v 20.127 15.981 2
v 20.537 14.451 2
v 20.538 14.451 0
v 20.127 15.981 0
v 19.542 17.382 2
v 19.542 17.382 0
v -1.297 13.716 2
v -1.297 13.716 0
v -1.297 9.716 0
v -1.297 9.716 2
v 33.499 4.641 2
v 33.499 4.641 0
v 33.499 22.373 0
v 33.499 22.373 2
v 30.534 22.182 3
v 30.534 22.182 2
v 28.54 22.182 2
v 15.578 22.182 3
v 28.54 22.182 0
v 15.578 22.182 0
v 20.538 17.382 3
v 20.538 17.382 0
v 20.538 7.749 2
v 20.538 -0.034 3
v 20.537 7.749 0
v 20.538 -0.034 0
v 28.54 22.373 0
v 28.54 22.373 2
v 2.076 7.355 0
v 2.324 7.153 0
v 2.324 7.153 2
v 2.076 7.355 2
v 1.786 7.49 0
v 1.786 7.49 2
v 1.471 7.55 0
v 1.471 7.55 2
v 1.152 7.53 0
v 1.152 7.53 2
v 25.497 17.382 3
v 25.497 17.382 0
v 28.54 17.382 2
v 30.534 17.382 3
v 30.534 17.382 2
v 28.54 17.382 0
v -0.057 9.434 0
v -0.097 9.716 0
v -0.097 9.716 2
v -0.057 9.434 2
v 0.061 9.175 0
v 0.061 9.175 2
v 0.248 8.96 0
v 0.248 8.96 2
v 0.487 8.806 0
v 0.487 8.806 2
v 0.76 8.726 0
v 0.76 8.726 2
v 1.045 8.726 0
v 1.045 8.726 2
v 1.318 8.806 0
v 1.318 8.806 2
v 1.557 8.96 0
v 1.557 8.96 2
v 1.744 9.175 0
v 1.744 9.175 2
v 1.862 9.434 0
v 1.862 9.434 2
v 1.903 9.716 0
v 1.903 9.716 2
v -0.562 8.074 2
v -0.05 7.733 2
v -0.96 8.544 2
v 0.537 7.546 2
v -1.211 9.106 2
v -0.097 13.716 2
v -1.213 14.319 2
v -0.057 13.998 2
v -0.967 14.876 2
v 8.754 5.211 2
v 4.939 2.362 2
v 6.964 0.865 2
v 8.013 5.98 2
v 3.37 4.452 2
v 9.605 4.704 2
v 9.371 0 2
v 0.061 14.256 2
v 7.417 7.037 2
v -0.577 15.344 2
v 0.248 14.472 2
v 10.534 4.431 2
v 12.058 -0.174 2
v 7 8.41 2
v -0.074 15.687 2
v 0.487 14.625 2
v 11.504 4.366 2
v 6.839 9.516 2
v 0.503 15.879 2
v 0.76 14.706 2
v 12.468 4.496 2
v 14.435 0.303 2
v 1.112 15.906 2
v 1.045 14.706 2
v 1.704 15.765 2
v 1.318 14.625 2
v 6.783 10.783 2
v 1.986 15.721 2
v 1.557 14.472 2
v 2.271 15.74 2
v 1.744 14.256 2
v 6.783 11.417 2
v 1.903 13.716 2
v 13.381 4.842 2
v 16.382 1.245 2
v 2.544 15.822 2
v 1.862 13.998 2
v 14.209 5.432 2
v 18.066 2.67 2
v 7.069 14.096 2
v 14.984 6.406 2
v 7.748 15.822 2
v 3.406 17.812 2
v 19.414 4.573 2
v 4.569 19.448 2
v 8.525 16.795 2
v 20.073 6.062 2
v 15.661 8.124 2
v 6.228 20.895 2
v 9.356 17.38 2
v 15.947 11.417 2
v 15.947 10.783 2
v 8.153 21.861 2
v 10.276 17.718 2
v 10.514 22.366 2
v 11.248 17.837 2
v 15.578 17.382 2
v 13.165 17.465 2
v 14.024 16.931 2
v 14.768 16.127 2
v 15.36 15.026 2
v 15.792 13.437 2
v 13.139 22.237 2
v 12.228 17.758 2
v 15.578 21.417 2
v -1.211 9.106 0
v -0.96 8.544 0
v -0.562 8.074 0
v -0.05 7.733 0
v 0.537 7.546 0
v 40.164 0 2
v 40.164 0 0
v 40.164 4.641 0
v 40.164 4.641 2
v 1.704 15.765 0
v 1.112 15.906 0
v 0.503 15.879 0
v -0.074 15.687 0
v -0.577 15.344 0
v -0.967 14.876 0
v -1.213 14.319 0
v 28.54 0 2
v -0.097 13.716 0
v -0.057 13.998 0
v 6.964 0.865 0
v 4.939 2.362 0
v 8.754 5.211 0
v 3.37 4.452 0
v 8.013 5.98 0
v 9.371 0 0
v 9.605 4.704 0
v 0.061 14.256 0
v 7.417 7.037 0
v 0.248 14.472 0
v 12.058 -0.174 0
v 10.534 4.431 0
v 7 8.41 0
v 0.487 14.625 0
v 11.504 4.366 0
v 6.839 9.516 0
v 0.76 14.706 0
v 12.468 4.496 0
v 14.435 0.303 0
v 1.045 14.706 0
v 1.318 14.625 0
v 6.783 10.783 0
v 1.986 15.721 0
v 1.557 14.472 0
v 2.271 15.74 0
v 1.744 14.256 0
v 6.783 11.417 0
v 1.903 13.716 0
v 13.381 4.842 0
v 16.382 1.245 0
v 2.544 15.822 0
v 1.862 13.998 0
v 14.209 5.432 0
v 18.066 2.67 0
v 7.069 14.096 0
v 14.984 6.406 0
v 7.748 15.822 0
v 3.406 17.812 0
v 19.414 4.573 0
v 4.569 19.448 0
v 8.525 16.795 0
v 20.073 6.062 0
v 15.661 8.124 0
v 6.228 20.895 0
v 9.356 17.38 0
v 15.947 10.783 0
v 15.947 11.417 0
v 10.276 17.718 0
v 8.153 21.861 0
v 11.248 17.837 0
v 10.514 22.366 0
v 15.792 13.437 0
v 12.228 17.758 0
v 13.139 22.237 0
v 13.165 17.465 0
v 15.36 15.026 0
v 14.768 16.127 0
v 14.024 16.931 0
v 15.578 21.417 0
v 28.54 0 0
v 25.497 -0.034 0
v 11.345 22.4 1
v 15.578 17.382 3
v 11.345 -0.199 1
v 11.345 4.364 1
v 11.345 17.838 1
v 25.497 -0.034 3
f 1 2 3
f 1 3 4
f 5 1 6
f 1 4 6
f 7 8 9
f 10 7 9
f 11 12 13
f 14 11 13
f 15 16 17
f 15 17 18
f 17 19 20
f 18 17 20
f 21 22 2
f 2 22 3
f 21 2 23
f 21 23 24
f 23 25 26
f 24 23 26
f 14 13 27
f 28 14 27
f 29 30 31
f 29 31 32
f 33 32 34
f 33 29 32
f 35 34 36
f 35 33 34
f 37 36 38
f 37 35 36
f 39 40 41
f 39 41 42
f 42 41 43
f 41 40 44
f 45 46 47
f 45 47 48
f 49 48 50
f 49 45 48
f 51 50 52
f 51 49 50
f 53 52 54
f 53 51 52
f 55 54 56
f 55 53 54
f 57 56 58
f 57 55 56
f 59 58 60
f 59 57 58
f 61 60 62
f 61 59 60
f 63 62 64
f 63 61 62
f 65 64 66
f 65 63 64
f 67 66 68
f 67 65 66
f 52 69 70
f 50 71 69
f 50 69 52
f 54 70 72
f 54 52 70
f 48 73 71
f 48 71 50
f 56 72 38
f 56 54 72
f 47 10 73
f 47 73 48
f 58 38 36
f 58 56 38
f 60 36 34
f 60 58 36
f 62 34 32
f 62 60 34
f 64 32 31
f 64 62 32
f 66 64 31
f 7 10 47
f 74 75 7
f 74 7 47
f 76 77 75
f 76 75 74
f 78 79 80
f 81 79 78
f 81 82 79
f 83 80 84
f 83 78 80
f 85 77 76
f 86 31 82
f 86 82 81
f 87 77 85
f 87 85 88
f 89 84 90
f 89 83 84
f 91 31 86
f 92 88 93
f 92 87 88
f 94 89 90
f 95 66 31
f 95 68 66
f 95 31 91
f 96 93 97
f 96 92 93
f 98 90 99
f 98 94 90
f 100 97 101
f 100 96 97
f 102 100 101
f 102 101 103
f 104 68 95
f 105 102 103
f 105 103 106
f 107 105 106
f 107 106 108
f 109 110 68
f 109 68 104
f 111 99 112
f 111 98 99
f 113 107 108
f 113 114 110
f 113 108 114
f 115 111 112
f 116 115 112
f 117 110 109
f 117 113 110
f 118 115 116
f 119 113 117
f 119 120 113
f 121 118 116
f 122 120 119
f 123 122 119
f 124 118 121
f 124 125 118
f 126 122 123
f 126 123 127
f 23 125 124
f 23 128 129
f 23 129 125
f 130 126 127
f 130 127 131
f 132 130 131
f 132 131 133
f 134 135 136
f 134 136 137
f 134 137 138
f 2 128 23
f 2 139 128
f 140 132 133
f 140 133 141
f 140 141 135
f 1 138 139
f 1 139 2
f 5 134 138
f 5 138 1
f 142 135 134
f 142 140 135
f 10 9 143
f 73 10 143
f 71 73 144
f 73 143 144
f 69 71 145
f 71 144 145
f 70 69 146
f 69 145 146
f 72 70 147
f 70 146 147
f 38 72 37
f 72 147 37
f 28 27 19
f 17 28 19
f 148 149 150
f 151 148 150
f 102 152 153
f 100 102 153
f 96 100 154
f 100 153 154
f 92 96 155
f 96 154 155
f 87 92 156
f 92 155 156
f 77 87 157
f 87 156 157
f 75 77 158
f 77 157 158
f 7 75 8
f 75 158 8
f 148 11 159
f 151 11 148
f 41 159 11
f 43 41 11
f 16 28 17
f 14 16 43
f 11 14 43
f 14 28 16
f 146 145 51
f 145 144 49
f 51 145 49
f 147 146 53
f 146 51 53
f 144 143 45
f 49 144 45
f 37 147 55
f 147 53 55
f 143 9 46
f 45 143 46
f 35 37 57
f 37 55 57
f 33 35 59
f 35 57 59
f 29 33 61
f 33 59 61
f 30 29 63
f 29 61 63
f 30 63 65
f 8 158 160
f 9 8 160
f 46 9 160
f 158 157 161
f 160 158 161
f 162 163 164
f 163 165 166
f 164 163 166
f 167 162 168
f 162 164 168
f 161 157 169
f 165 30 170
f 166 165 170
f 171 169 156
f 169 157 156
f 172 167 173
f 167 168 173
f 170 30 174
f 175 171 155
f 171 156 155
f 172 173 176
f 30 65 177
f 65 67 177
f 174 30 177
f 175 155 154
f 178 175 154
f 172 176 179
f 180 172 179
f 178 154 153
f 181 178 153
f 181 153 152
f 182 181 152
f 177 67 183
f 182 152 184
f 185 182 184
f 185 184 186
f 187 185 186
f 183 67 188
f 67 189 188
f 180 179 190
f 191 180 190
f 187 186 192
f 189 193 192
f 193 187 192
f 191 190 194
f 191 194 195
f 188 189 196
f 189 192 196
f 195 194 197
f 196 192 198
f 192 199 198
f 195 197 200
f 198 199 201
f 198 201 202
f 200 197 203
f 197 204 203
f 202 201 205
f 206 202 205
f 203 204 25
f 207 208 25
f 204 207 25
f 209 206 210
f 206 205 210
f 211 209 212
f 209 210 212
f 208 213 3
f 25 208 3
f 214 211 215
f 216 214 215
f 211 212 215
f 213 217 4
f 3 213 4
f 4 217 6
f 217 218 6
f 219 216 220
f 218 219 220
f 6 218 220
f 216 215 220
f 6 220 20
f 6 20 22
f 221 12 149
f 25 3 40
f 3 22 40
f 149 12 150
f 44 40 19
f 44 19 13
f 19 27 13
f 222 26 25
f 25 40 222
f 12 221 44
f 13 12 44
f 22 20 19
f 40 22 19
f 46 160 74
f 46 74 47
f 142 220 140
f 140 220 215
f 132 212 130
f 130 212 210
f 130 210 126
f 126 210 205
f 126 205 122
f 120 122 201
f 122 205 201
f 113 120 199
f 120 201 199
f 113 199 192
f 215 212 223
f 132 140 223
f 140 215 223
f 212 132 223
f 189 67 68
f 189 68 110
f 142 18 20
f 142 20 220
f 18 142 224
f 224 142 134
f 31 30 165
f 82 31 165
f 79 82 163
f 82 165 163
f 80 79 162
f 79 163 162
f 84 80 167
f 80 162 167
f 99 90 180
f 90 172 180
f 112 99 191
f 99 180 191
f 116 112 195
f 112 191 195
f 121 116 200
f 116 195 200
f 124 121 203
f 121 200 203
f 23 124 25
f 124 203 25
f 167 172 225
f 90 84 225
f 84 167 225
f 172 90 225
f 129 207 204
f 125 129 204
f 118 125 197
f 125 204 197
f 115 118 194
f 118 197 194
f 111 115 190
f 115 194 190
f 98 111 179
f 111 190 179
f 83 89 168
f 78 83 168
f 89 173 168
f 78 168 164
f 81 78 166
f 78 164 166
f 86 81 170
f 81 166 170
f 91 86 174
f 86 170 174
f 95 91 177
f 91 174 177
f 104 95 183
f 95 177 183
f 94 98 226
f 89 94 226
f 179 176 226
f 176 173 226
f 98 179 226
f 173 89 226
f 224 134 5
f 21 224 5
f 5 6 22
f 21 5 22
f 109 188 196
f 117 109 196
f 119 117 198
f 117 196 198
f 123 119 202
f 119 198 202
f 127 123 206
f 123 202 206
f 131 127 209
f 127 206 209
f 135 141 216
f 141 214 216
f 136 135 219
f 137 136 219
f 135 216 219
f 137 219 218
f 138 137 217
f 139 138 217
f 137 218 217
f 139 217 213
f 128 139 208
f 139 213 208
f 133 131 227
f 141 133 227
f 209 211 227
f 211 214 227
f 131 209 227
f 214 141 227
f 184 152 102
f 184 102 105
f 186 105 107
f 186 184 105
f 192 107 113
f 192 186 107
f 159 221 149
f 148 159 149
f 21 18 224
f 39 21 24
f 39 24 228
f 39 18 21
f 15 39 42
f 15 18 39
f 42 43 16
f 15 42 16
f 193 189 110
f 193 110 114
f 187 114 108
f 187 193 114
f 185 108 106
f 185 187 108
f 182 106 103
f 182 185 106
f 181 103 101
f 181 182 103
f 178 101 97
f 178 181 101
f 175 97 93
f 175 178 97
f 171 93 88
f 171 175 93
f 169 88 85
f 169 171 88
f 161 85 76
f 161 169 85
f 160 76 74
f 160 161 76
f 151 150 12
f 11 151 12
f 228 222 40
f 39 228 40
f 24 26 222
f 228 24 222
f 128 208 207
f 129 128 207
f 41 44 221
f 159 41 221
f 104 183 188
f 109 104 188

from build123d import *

# Parameters (mm, degrees)
PAD_DEPTH    = 2
PAD001_DEPTH = 3
PAD002_DEPTH = 2
PAD003_DEPTH = 2


with BuildPart() as part:
    # Sketch001 → Pad (new body)
    with BuildSketch(Plane.XY):
        with BuildLine():
            add(Edge.make_bspline(
                [(11.345455, -0.198864), (16.382955, -0.198864), (20.826136, 3.529545), (20.826136, 10.782955)],
                knots=[0, 0, 0, 0, 1, 1, 1, 1], degree=3))
            Line((20.826136, 10.782955), (20.826136, 11.417045))
            add(Edge.make_bspline(
                [(20.826136, 11.417045), (20.826136, 18.670455), (16.382955, 22.4), (11.345455, 22.4)],
                knots=[0, 0, 0, 0, 1, 1, 1, 1], degree=3))
            add(Edge.make_bspline(
                [(11.345455, 22.4), (6.306818, 22.4), (1.903409, 18.670455), (1.903409, 11.417045)],
                knots=[0, 0, 0, 0, 1, 1, 1, 1], degree=3))
            Line((1.903409, 11.417045), (1.903409, 10.782955))
            add(Edge.make_bspline(
                [(1.903409, 10.782955), (1.903409, 3.529545), (6.306818, -0.198864), (11.345455, -0.198864)],
                knots=[0, 0, 0, 0, 1, 1, 1, 1], degree=3))
        make_face()
        with BuildLine():
            add(Edge.make_bspline(
                [(11.345455, 4.363636), (9.004545, 4.363636), (6.782955, 5.948864), (6.782955, 10.782955)],
                knots=[0, 0, 0, 0, 1, 1, 1, 1], degree=3))
            Line((6.782955, 10.782955), (6.782955, 11.417045))
            add(Edge.make_bspline(
                [(6.782955, 11.417045), (6.782955, 16.252273), (9.004545, 17.8375), (11.345455, 17.8375)],
                knots=[0, 0, 0, 0, 1, 1, 1, 1], degree=3))
            add(Edge.make_bspline(
                [(11.345455, 17.8375), (13.685227, 17.8375), (15.946591, 16.252273), (15.946591, 11.417045)],
                knots=[0, 0, 0, 0, 1, 1, 1, 1], degree=3))
            Line((15.946591, 11.417045), (15.946591, 10.782955))
            add(Edge.make_bspline(
                [(15.946591, 10.782955), (15.946591, 5.948864), (13.685227, 4.363636), (11.345455, 4.363636)],
                knots=[0, 0, 0, 0, 1, 1, 1, 1], degree=3))
        make_face(mode=Mode.SUBTRACT)
    extrude(amount=PAD_DEPTH)

    # Sketch003 → Pad001 (join)
    with BuildSketch(Plane(origin=(-7.7, 0, 0), x_dir=(1, 0, 0), z_dir=(0, 0, 1))):
        Polygon((38.234091, 22.181818), (23.278409, 22.181818), (23.278409, 17.381818), (28.2375, 17.381818), (28.2375, -0.034091), (33.196591, -0.034091), (33.196591, 17.381818), (38.234091, 17.381818), align=None)
    extrude(amount=PAD001_DEPTH)

    # Sketch004 → Pad002 (join)
    with BuildSketch(Plane(origin=(-13, 0, 0), x_dir=(1, 0, 0), z_dir=(0, 0, 1))):
        Polygon((46.498864, 4.640909), (46.498864, 22.372727), (41.539773, 22.372727), (41.539773, 0), (53.163636, 0), (53.163636, 4.640909), align=None)
    extrude(amount=PAD002_DEPTH)

    # Sketch005 → Pad003 (join)
    with BuildSketch(Plane(origin=(0.5, 0, 0), x_dir=(1, 0, 0), z_dir=(0, 0, 1))):
        with BuildLine():
            ThreePointArc((-1.797468, 9.715848), (-1.062216, 8.07435), (0.652091, 7.530048))
            ThreePointArc((1.82363, 7.152552), (1.285914, 7.490432), (0.652091, 7.530048))
            Line((1.82363, 7.152552), (2.602532, 9.715848))
            Line((2.602532, 9.715848), (2.602532, 13.715848))
            Line((2.04395, 15.821661), (2.602532, 13.715848))
            ThreePointArc((1.204151, 15.764606), (1.628824, 15.722862), (2.04395, 15.821661))
            ThreePointArc((1.204151, 15.764606), (-0.837718, 15.532928), (-1.797468, 13.715848))
            Line((-1.797468, 13.715848), (-1.797468, 9.715848))
        make_face()
        with BuildLine():
            ThreePointArc((1.402532, 13.715848), (0.402532, 14.715848), (-0.597468, 13.715848))
            Line((-0.597468, 13.715848), (-0.597468, 9.715848))
            ThreePointArc((-0.597468, 9.715848), (0.402532, 8.715848), (1.402532, 9.715848))
            Line((1.402532, 9.715848), (1.402532, 13.715848))
        make_face(mode=Mode.SUBTRACT)
    extrude(amount=PAD003_DEPTH)


solid = part.part
